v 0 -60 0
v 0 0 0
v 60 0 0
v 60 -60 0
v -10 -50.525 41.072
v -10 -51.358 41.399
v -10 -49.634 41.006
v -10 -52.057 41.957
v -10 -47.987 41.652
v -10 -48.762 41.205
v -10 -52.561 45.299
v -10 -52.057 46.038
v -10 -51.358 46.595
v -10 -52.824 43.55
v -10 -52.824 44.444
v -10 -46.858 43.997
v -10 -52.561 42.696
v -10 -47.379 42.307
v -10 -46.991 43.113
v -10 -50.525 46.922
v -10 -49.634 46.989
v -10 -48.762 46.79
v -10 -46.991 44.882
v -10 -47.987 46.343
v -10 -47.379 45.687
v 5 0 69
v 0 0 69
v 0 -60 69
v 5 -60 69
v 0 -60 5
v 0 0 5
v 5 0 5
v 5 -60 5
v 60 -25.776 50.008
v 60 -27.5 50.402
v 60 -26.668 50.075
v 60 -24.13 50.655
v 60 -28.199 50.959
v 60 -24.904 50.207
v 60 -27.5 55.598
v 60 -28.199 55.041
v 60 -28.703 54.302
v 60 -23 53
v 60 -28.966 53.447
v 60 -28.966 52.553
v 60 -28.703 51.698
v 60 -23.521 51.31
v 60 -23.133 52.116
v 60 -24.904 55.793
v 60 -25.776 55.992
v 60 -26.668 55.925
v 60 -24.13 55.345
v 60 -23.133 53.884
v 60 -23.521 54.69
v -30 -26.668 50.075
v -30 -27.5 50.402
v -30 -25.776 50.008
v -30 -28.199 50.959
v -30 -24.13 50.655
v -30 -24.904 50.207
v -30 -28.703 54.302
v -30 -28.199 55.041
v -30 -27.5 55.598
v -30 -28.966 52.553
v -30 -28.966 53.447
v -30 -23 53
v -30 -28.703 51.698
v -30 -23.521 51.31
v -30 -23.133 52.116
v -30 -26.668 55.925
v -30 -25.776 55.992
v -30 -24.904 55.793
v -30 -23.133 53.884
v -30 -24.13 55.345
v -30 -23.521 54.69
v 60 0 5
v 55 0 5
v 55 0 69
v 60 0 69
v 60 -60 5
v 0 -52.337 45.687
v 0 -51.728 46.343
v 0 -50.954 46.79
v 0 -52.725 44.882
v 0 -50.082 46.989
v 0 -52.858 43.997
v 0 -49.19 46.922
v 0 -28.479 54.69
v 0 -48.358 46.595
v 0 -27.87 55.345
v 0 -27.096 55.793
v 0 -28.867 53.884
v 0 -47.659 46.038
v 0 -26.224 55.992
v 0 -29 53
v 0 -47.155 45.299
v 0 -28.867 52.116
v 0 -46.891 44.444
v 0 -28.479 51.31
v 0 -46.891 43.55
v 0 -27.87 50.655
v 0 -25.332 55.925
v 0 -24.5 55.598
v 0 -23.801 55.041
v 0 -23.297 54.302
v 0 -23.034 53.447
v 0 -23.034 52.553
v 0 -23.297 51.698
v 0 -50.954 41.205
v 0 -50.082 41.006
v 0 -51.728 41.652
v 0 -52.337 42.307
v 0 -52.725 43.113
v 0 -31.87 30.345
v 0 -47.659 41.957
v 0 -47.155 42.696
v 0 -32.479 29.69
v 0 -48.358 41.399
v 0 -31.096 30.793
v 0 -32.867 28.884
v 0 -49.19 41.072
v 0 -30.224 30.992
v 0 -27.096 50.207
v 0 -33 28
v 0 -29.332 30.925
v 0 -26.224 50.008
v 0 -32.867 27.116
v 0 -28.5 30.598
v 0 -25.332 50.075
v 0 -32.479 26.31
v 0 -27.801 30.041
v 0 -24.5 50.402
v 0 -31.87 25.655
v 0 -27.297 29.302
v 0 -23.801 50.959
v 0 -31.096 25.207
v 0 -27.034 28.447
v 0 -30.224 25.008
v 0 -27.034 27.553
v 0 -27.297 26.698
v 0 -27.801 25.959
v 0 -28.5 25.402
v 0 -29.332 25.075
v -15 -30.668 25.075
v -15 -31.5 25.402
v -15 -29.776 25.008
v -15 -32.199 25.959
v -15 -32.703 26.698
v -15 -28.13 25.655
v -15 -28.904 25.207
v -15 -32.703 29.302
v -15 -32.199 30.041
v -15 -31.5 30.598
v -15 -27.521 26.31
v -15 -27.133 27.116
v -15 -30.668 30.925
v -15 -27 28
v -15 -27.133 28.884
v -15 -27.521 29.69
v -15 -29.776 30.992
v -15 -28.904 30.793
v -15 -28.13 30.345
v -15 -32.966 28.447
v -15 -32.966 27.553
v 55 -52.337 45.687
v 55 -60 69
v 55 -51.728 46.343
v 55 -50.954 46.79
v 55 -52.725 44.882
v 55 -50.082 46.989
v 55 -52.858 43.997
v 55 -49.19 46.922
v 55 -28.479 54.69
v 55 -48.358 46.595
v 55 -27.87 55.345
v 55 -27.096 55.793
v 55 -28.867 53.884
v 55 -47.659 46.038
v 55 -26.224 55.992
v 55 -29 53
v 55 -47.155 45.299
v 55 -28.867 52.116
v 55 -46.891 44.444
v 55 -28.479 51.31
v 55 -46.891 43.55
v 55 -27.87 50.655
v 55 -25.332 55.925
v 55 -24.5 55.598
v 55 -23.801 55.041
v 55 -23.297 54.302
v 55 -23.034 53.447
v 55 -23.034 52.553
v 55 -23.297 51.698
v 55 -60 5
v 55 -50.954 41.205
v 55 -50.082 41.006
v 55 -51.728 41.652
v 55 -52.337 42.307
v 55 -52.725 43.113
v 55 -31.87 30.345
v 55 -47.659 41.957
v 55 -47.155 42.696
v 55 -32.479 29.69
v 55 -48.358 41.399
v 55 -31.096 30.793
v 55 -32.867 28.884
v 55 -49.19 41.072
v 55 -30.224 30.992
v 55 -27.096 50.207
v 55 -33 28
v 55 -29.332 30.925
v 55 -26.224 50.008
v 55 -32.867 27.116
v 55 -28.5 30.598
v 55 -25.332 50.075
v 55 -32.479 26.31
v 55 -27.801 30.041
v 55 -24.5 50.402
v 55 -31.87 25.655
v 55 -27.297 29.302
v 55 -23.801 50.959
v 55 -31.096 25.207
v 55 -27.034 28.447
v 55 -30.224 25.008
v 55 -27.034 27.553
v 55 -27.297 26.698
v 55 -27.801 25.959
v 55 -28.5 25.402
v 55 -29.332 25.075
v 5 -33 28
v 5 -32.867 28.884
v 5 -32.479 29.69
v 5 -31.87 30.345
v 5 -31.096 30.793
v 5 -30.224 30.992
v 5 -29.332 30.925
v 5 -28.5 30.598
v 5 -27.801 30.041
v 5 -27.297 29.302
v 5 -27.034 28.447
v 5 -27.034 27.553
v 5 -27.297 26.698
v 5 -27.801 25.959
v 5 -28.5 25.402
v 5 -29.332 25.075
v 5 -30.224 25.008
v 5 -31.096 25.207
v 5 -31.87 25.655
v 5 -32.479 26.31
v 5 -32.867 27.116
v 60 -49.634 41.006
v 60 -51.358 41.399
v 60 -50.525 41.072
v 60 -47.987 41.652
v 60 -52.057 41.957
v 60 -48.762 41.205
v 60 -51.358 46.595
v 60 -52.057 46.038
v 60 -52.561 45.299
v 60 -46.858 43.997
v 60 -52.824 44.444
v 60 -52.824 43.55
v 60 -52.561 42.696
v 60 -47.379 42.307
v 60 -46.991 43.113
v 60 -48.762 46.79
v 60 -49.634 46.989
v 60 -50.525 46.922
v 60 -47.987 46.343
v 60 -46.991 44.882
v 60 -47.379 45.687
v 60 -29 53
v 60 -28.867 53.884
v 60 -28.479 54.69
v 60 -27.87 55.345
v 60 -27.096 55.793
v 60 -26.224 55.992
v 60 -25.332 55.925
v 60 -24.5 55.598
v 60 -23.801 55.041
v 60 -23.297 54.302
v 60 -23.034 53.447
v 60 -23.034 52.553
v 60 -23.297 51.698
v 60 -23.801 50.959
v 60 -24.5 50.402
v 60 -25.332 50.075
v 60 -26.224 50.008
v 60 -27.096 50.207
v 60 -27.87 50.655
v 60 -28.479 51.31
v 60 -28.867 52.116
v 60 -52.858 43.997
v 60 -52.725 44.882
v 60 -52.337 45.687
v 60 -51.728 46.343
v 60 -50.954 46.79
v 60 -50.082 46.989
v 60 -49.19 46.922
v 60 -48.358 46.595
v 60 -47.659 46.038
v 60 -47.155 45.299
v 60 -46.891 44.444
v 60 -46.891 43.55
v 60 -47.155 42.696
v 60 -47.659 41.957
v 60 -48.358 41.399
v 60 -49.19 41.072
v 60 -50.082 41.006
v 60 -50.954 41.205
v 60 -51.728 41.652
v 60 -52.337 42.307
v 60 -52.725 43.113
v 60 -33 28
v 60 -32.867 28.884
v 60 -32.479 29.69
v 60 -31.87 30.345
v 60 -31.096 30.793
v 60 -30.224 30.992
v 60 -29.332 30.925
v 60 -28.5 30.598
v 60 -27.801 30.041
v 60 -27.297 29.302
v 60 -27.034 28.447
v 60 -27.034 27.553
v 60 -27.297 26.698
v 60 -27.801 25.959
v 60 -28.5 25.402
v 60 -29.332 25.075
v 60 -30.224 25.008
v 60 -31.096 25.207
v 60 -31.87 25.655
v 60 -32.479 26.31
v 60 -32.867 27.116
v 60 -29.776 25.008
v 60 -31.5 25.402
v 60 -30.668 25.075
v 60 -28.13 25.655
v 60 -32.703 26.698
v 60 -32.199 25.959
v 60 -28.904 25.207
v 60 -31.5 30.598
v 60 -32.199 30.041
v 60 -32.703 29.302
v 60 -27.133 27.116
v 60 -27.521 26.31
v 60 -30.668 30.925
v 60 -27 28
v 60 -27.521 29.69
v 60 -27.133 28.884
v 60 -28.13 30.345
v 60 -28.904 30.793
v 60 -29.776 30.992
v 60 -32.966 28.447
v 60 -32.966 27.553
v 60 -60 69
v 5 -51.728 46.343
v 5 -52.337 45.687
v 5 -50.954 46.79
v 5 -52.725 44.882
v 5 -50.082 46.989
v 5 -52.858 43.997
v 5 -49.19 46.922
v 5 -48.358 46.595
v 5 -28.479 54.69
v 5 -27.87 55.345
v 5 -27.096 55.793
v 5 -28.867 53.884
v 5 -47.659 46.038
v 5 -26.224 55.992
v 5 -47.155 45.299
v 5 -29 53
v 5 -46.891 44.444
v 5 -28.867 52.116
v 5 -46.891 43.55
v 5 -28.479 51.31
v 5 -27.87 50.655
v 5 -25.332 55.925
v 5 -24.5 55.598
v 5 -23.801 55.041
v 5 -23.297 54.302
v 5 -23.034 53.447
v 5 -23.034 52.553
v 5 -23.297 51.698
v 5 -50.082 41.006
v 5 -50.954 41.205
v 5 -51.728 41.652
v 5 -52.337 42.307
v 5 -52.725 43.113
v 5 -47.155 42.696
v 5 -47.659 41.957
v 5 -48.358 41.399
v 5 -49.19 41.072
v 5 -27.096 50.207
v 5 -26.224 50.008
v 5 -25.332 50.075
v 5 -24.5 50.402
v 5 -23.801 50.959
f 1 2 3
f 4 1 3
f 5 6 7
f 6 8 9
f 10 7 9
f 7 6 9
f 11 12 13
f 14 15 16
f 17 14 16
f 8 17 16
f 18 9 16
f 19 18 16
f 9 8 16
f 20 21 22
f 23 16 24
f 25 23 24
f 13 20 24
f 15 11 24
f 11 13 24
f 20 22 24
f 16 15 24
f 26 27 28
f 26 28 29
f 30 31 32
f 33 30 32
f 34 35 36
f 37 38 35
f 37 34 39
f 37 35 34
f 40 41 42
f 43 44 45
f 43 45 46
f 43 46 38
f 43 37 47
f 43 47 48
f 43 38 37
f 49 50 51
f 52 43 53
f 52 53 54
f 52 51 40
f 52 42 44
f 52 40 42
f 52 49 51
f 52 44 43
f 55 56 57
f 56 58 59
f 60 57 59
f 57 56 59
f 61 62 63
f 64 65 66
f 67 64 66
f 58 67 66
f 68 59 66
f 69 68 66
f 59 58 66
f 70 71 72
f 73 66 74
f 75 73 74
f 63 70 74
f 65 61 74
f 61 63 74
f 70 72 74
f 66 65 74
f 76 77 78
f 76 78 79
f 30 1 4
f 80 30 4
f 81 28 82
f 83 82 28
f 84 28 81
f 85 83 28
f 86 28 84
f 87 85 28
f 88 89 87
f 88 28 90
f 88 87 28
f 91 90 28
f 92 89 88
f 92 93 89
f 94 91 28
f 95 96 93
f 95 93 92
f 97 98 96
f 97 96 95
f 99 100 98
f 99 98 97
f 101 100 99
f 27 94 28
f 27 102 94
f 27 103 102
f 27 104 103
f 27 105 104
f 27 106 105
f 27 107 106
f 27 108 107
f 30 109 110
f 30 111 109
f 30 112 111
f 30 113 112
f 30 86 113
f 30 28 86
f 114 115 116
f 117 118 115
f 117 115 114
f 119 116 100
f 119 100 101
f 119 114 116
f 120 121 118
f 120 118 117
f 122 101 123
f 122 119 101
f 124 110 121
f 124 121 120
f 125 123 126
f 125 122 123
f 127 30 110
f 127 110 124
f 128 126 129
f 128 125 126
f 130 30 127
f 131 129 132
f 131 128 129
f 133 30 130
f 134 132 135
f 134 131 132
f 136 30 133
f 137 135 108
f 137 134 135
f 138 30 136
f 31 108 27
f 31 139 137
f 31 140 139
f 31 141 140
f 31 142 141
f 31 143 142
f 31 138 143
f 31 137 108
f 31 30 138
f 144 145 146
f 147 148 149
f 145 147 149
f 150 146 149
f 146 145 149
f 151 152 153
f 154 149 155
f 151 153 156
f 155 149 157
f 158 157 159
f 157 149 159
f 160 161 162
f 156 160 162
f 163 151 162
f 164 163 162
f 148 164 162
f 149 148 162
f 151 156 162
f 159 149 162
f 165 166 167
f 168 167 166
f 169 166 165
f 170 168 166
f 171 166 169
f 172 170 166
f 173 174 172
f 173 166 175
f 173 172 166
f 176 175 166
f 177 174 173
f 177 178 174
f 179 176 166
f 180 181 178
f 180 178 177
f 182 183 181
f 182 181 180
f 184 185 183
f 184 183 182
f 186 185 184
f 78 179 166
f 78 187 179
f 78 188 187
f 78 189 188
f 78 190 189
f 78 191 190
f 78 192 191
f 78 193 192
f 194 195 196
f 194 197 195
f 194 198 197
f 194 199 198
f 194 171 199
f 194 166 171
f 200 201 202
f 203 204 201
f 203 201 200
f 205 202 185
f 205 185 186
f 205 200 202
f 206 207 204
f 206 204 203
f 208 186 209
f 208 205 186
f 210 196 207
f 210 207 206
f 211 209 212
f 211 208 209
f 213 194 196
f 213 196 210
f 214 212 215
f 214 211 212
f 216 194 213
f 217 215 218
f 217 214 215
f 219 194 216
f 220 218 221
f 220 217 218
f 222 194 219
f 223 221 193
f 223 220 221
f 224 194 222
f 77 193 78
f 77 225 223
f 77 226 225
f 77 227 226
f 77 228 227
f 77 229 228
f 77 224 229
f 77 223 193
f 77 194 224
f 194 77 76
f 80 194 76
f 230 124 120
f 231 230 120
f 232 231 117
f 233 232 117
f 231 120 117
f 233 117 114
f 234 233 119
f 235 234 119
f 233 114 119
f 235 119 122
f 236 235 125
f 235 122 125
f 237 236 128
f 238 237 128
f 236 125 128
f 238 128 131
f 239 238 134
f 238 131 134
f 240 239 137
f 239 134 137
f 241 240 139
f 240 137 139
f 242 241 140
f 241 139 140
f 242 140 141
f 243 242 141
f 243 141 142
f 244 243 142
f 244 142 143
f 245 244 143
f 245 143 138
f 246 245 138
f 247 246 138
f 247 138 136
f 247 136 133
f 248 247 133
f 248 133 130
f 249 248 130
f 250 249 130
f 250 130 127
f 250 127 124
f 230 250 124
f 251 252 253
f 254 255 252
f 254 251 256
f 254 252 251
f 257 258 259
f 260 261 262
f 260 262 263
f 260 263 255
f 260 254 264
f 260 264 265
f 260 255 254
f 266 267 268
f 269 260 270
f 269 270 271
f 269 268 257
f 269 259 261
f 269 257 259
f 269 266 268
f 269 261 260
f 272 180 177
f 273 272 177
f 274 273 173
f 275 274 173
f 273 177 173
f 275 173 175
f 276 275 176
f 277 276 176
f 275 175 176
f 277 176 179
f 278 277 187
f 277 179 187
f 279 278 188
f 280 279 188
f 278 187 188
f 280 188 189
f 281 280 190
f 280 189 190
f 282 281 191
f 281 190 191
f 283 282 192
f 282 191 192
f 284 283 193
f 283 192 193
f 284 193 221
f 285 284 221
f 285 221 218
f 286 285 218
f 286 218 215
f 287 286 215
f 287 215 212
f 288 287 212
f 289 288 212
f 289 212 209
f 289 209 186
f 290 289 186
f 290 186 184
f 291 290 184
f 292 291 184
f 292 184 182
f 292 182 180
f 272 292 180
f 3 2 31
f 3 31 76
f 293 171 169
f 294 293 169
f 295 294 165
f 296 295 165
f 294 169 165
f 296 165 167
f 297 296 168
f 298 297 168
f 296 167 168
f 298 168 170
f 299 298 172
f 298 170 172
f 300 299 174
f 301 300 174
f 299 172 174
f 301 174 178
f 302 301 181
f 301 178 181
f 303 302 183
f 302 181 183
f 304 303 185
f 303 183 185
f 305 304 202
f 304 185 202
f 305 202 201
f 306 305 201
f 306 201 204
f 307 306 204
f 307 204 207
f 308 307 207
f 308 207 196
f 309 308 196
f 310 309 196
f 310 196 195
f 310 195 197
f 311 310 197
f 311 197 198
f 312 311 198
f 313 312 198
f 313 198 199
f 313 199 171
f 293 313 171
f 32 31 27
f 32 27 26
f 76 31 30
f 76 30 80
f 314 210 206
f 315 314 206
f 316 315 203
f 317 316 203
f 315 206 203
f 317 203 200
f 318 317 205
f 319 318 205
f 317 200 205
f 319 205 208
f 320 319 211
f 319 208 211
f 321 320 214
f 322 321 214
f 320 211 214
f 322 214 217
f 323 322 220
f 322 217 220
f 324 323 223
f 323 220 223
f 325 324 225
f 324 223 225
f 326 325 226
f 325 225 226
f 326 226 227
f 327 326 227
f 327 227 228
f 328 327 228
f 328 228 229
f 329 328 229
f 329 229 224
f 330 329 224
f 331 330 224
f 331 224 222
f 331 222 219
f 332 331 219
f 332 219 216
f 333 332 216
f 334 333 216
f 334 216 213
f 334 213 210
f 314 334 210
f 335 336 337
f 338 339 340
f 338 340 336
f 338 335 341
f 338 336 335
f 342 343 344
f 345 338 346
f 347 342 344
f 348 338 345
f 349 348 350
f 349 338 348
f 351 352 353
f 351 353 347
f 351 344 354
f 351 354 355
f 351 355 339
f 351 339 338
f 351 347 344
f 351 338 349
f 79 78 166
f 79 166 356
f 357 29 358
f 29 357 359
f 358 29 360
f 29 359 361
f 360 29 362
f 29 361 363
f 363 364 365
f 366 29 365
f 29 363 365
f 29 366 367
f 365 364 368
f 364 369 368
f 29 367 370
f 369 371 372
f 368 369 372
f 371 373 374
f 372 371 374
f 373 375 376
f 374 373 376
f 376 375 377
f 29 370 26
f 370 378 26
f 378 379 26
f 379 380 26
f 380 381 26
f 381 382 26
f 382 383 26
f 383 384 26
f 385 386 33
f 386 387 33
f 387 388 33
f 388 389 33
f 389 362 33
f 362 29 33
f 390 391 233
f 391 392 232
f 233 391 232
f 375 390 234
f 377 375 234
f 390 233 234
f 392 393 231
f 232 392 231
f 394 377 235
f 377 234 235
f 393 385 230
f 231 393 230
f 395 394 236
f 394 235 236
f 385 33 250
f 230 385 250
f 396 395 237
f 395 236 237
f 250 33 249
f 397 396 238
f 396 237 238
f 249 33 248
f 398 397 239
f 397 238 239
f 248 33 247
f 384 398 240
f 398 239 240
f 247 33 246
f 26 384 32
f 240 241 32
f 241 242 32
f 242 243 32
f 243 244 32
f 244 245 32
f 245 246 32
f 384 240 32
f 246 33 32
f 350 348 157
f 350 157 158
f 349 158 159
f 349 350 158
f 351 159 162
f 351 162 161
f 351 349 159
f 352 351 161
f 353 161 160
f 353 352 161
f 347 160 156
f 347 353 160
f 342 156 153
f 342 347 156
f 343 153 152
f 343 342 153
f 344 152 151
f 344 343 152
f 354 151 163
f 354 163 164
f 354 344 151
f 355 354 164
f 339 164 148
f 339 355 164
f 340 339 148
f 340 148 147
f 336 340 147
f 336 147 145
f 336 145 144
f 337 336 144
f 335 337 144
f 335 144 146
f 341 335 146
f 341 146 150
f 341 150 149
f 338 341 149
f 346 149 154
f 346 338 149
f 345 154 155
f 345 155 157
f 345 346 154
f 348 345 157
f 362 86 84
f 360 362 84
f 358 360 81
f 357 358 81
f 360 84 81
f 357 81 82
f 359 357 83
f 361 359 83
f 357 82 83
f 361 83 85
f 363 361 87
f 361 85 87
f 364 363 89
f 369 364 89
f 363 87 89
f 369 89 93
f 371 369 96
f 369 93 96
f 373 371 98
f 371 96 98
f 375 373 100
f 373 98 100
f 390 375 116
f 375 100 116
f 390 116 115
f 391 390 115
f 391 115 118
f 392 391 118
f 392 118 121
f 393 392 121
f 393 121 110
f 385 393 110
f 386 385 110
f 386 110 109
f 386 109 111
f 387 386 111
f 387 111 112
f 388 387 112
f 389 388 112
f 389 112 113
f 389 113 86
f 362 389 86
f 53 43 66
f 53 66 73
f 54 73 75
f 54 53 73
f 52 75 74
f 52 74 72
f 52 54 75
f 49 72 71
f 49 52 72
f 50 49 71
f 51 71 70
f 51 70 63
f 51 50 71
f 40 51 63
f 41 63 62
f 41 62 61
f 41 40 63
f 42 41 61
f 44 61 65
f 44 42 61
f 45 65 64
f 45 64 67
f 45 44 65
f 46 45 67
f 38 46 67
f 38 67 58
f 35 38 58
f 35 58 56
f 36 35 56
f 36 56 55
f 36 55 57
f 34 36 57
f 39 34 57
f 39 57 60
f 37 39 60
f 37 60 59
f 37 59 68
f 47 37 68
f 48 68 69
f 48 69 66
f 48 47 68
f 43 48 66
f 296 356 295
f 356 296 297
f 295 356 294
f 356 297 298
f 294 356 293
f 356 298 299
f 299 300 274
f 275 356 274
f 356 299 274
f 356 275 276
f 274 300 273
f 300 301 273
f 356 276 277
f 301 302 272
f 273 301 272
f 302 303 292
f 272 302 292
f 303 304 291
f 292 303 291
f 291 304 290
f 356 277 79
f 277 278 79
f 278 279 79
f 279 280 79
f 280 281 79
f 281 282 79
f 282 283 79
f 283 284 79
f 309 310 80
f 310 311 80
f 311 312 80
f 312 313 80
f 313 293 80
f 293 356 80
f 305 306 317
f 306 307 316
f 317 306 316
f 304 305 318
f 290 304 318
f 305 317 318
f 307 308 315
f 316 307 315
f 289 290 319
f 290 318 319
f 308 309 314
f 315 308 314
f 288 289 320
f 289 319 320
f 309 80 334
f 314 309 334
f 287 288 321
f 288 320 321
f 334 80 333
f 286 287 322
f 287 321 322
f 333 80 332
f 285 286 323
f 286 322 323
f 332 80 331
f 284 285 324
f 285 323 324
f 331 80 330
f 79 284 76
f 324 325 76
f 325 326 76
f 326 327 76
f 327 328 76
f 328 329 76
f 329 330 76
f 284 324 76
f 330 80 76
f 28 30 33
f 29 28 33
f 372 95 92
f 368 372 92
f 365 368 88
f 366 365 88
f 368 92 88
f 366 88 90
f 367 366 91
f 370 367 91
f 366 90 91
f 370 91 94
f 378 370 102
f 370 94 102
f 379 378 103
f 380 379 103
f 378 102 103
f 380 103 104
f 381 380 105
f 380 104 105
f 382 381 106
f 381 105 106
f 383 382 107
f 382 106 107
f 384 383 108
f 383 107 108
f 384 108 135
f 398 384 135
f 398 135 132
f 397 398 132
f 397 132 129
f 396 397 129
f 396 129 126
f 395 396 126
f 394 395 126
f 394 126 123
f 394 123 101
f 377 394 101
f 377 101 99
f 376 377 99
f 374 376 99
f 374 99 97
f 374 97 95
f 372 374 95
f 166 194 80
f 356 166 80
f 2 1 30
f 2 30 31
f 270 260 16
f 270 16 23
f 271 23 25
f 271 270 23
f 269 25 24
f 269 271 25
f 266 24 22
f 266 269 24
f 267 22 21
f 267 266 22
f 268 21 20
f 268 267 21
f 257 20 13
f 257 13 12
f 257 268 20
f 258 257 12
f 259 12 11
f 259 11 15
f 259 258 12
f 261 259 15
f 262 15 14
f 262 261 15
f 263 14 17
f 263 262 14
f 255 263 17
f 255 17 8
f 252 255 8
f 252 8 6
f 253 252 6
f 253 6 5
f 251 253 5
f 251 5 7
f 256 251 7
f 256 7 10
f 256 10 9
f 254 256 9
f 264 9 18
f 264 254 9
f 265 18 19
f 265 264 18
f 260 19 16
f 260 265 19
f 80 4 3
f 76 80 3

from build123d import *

# Parameters (mm, degrees)
F0_W      = 60
F0_H      = 60
F1_DEPTH  = 5
F2_W      = 5
F2_H      = 60
F3_DEPTH  = 64
F7_R      = 3
F8_DEPTH  = 60
F9_R      = 3
F10_DEPTH = 70
F11_R     = 3
F12_DEPTH = 90
F13_R     = 3
F14_DEPTH = 75


with BuildPart() as f1:
    # F0 (on Top) → F1 (new body)
    with BuildSketch(Plane.XY):
        with Locations((30, -30)):
            Rectangle(F0_W, F0_H)
    extrude(amount=F1_DEPTH)


with BuildPart() as f3:
    # F2 (on face) → F3 (new body)
    with BuildSketch(Plane.XY.offset(5)):
        with Locations((57.5, -30)):
            Rectangle(F2_W, F2_H)
    extrude(amount=F3_DEPTH)


with BuildPart() as f4_1:
    # F4: copy of F3
    add(f3.part.moved(Location((-40000, 0, 0))))


with BuildPart() as f6_1:
    # F6: copy of F3
    add(f3.part.moved(Location((-55, 0, 0))))


with BuildPart() as f8_tool:
    # F7 (on face) → F8 (new body, through all)
    with BuildSketch(Plane(origin=(0, 0, 0), x_dir=(0, -1, 0), z_dir=(-1, 0, 0))):
        with Locations((30, 28)):
            Circle(F7_R)
        with Locations((49.85793, 43.997269)):
            Circle(F7_R)
        with Locations((26, 53)):
            Circle(F7_R)
    extrude(amount=-F8_DEPTH)


with BuildPart() as f3_1:
    add(f3.part)

    # F8: cut by f8_tool
    add(f8_tool.part, mode=Mode.SUBTRACT)


with BuildPart() as f6_1_1:
    add(f6_1.part)

    # F8: cut by f8_tool
    add(f8_tool.part, mode=Mode.SUBTRACT)


with BuildPart() as f10:
    # F9 (on face) → F10 (new body)
    with BuildSketch(Plane.YZ.offset(60)):
        with Locations((-49.85793, 43.997269)):
            Circle(F9_R)
    extrude(amount=-F10_DEPTH)


with BuildPart() as f12:
    # F11 (on face) → F12 (new body)
    with BuildSketch(Plane.YZ.offset(60)):
        with Locations((-26, 53)):
            Circle(F11_R)
    extrude(amount=-F12_DEPTH)


with BuildPart() as f14:
    # F13 (on face) → F14 (new body)
    with BuildSketch(Plane.YZ.offset(60)):
        with Locations((-30, 28)):
            Circle(F13_R)
    extrude(amount=-F14_DEPTH)


solid = Compound([f1.part, f3_1.part, f6_1_1.part, f10.part, f12.part, f14.part])
